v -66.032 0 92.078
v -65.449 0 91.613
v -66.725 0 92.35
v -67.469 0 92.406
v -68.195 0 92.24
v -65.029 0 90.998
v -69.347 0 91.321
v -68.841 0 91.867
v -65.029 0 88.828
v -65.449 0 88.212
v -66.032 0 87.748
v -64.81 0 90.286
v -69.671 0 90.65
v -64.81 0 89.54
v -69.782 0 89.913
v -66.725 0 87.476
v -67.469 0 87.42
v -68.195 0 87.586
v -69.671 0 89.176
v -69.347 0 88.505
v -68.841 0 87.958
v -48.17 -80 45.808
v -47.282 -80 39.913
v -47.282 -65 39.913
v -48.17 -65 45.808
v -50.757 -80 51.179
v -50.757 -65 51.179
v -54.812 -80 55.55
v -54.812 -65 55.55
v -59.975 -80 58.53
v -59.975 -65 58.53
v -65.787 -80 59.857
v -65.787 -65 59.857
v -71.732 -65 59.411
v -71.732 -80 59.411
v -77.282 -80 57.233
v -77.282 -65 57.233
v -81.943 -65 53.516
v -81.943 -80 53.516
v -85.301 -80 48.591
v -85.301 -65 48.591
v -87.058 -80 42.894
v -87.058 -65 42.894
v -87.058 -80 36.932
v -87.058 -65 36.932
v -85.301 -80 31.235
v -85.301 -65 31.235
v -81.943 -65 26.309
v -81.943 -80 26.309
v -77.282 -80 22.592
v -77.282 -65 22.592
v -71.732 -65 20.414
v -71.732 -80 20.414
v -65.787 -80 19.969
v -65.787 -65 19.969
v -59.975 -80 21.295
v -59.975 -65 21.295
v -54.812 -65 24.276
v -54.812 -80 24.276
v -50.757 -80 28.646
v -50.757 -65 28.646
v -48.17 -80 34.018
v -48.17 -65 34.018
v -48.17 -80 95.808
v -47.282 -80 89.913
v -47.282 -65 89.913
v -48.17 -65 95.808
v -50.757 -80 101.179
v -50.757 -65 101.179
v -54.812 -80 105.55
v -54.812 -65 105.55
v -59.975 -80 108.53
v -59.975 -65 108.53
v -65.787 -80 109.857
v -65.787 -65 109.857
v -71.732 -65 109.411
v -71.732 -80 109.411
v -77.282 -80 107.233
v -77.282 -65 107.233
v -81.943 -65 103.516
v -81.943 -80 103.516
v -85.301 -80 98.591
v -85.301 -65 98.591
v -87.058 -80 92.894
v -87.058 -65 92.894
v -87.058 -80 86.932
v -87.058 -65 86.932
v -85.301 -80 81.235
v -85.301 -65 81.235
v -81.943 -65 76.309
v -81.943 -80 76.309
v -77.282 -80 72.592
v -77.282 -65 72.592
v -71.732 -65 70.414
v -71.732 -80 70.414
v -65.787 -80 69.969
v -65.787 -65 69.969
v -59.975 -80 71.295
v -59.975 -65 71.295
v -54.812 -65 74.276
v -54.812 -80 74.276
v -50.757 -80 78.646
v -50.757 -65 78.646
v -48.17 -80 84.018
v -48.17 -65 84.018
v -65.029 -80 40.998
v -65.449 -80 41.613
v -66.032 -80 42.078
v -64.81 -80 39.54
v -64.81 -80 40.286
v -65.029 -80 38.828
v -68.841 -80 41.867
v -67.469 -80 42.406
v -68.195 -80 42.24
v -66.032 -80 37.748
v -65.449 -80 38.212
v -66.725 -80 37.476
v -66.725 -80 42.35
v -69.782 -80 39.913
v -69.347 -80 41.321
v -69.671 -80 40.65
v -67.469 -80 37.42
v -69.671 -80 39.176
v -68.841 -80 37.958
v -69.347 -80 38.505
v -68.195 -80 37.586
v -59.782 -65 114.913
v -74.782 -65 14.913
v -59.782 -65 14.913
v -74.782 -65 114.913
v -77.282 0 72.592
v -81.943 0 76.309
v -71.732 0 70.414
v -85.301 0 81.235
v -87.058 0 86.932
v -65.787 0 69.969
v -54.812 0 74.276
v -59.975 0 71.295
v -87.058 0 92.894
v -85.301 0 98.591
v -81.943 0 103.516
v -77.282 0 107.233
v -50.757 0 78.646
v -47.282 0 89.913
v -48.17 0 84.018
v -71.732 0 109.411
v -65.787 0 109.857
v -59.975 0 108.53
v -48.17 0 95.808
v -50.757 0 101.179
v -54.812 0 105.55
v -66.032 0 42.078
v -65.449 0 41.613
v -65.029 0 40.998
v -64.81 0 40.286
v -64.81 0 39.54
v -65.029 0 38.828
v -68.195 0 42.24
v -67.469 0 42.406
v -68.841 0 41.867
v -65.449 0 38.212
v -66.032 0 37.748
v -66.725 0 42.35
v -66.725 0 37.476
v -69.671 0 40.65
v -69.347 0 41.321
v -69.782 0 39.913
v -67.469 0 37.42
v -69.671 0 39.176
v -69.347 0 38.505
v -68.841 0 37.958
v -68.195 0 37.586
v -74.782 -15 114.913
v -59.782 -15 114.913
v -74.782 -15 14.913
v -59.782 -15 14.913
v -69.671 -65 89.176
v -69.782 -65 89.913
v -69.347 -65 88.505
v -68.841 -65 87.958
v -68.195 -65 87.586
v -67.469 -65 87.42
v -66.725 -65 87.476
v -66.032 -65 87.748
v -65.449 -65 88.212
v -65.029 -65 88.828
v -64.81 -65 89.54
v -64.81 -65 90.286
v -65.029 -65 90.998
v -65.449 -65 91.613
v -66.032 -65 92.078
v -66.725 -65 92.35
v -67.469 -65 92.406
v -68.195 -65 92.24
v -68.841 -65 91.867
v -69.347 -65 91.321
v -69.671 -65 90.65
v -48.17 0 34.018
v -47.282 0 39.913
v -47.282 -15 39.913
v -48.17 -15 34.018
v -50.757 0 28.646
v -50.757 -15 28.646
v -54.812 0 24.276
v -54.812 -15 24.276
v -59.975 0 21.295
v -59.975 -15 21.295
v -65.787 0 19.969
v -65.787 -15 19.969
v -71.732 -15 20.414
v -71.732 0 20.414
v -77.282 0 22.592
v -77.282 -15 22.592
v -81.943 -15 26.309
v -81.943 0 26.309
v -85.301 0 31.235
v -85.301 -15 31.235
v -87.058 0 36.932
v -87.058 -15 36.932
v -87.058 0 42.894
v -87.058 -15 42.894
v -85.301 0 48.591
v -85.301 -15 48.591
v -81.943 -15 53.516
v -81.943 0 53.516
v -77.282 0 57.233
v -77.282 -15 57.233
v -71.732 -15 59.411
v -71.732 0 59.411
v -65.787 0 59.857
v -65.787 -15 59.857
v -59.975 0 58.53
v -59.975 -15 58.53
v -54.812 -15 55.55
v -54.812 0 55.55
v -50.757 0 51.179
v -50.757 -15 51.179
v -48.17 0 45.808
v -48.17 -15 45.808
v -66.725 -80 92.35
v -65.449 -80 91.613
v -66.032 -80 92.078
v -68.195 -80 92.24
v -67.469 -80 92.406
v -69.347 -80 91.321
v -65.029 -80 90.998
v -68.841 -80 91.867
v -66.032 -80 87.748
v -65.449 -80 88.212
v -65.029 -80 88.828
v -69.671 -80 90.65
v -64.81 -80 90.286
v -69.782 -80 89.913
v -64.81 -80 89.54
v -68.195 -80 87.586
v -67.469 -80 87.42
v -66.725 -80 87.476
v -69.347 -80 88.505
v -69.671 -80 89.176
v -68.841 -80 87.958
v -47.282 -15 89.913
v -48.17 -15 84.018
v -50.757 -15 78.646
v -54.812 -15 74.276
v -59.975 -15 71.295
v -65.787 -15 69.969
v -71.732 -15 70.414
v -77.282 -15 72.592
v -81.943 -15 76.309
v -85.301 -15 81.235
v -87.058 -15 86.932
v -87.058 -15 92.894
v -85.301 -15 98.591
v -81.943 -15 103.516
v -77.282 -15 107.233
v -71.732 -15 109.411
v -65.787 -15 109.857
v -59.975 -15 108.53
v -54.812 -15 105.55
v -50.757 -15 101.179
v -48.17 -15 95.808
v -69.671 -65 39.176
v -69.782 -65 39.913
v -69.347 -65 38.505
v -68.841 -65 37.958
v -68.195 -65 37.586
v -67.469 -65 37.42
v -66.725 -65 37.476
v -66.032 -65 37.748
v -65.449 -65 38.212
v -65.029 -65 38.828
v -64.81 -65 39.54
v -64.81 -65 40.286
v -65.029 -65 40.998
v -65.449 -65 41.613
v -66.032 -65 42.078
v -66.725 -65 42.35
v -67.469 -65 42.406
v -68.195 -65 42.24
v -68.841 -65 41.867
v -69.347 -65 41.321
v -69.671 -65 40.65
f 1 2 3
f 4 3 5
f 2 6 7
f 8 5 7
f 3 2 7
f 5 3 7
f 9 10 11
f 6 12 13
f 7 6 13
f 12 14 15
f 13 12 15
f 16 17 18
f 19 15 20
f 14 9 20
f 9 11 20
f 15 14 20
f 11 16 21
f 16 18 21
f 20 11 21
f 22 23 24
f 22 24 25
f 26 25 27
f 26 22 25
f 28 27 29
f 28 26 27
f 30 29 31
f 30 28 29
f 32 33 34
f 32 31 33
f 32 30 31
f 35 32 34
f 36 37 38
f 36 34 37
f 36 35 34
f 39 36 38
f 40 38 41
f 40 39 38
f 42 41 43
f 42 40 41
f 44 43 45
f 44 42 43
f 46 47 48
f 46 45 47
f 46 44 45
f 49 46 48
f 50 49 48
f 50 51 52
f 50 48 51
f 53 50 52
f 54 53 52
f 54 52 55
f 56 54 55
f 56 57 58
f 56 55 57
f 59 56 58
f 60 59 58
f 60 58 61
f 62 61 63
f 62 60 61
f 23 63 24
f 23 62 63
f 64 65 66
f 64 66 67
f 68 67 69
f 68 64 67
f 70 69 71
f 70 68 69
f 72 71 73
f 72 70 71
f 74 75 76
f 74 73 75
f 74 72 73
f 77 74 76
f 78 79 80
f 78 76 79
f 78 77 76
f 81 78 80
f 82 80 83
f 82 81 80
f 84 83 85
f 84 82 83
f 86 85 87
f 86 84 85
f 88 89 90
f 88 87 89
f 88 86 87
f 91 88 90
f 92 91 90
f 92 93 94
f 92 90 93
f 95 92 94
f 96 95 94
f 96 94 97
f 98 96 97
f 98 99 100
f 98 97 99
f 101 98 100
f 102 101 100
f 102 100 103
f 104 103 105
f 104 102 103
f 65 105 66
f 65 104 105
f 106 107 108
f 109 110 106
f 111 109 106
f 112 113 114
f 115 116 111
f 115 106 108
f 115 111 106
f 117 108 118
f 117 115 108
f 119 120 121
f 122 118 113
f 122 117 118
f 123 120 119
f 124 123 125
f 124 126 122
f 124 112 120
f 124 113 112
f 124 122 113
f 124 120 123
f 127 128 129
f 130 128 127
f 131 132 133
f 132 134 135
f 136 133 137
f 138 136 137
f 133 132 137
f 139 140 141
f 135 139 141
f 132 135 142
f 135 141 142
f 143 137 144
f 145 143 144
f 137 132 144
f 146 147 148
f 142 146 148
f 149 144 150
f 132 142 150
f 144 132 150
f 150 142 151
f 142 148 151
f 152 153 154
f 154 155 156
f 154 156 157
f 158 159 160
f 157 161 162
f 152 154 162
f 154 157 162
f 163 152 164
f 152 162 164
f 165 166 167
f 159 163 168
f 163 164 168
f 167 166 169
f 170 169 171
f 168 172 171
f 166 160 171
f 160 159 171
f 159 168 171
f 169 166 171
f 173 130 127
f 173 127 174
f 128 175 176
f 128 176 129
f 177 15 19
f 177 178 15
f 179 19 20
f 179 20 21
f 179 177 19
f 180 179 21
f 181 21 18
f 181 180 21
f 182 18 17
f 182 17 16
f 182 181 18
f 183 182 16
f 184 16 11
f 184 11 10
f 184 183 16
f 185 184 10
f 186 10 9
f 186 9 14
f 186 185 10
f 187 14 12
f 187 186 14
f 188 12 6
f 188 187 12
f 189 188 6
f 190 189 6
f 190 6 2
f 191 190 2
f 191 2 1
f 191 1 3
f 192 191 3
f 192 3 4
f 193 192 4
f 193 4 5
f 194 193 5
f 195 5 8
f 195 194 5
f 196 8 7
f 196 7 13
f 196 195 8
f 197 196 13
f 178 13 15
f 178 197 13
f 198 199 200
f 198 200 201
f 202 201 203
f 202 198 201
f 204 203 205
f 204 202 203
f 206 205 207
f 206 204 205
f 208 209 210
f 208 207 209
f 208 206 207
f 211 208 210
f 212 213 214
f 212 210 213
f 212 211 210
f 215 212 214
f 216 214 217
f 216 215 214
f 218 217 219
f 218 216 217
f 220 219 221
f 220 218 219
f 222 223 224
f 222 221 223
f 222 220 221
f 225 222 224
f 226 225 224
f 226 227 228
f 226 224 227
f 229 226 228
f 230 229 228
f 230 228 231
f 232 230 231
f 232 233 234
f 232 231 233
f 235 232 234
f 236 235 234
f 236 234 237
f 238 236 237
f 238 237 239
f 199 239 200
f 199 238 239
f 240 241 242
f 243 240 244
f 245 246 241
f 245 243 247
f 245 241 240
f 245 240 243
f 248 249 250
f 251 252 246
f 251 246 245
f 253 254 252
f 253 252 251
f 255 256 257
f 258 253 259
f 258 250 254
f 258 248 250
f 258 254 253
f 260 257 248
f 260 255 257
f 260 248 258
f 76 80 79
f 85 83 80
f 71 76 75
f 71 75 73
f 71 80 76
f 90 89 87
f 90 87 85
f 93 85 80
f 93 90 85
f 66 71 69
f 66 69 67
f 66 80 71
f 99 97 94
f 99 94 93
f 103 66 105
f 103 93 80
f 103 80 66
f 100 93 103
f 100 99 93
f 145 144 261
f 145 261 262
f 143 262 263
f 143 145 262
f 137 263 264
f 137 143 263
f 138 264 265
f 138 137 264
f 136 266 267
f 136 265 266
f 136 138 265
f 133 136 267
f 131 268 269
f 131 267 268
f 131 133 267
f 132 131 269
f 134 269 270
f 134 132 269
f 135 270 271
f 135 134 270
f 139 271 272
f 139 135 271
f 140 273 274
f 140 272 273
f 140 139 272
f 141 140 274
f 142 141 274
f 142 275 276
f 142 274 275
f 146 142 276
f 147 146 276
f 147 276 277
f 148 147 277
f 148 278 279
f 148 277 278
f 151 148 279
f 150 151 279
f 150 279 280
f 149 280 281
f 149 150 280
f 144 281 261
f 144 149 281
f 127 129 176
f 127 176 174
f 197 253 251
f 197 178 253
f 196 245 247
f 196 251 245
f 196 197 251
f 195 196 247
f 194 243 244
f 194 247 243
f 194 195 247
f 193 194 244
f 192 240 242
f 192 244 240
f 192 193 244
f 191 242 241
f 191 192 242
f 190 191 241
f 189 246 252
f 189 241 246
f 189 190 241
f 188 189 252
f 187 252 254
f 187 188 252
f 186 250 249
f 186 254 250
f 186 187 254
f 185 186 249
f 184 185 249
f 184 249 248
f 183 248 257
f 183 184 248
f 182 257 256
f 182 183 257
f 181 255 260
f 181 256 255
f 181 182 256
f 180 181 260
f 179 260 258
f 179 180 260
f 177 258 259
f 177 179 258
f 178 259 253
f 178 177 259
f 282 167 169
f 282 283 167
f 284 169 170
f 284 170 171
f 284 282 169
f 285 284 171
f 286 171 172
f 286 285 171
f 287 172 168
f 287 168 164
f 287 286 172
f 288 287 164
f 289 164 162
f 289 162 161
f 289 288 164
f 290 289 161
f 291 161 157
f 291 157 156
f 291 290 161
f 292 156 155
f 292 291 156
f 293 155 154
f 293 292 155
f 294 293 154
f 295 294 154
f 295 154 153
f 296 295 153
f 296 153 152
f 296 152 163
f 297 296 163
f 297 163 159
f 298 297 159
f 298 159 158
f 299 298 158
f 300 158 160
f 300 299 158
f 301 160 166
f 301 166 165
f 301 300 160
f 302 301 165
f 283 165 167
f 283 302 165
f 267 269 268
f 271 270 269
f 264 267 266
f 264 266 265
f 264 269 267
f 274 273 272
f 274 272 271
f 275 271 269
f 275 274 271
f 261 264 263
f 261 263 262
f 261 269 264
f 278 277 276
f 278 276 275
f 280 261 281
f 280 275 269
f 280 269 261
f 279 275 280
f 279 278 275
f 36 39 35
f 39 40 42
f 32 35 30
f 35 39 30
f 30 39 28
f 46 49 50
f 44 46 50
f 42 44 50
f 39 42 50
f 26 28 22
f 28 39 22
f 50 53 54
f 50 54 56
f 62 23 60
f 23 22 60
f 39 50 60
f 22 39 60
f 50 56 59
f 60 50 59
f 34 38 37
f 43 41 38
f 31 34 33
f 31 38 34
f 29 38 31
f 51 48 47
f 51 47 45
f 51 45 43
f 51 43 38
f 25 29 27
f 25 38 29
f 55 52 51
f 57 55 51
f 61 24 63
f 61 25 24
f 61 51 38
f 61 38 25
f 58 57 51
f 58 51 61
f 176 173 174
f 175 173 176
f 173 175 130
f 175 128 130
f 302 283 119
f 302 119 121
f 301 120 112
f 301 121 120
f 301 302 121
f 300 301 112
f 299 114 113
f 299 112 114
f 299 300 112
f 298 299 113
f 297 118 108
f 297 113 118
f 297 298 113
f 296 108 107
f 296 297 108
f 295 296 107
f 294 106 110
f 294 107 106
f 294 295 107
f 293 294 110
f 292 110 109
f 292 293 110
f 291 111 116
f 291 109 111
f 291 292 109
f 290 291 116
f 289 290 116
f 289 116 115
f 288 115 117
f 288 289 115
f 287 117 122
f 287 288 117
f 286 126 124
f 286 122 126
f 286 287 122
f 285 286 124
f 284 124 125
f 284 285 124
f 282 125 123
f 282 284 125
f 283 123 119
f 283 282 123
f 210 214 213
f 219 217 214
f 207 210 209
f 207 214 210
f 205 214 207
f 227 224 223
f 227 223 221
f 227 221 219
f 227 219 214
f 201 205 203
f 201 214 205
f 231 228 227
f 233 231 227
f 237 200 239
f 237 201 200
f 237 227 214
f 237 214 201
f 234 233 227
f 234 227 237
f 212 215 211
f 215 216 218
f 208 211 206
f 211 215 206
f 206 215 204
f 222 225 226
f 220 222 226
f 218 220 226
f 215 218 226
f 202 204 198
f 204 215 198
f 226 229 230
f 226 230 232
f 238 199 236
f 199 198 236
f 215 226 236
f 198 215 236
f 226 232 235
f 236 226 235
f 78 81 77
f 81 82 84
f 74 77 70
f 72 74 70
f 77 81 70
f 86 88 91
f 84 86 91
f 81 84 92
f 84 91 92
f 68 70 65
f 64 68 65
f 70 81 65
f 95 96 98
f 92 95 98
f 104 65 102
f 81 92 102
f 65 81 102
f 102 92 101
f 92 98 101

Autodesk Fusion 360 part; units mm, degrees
sketch "草图1" plane through (0, 0, 0) normal (1, 0, 0) x (0, 0, -1) in component "body"
  line L0 (0, 0) -> (-100, 0)
  line L1 (-100, 0) -> (-100, 50)
  line L2 (-100, 50) -> (0, 50)
  line L3 (0, 50) -> (0, 0)
  dimension "d11" = 100
  dimension "d12" = 50
extrude "拉伸1" add sketch "草图1" along normal blind 15 makes body 1 in component "body"
sketch "草图1 (2)" plane through (0, 50, 0) normal (0, 1, 0) x (-1, 0, 0) in component "axis"
  line L0 (0, 0) -> (0, 100)
  line L1 (0, 100) -> (-15, 100)
  line L2 (-15, 100) -> (-15, 0)
  line L3 (-15, 0) -> (0, 0)
  circle A0 centre (-7.5, 25) radius 2.5
  line L4 (0, 50) -> (-46.2077, 50)
  circle A1 centre (-7.5, 75) radius 2.5
  dimension "d15" = 5
  dimension "d16" = 25
  dimension "d17" = 7.5
extrude "拉伸1'" add sketch "草图1 (2)" along normal blind 15 and the other way blind 65 separate body contours A0 | A1 makes body 2 at (5.0124, 28.3333, 24.7511) makes body 3 at (5.0124, 28.3333, 74.7511) in component "axis"
sketch "草图2" plane through (0, 0, 0) normal (0, -1, 0) x (1, 0, 0)
  line L0 (0, 100) -> (0, 0)
  line L1 (0, 0) -> (15, 0)
  line L2 (15, 0) -> (15, 100)
  line L3 (15, 100) -> (0, 100)
  circle A0 centre (-67.2818, 39.9129) radius 20
  dimension "d26" = 40
extrude "拉伸2" add sketch "草图2" along normal blind 15 separate body contours A0 makes body 4
copy_body "实体->零部件1" bodies 4 removing the originals makes body 5 in component "wheel"
component "body" placed x (1, 0, 0) y (0, -1, 0) z (0, 0, -1) at (-74.7818, -15, 114.9129)
component "axis" placed x (1, 0, 0) y (0, -1, 0) z (0, 0, -1) at (-74.7818, -15, 114.9129)
component "wheel" placed x (1, 0, 0) y (0, 1, 0) z (0, 0, 1) at (0, 0, 0)
component "wheel" placed x (1, 0, 0) y (0, -1, 0) z (0, 0, -1) at (0, -80, 79.8258)
component "wheel" placed x (1, 0, 0) y (0, -1, 0) z (0, 0, -1) at (0, -80, 129.8258)
component "wheel" placed x (1, 0, 0) y (0, 1, 0) z (0, 0, 1) at (0, 0, 50)
equation "length = 100 mm"
equation "width = 50 mm"
equation "thickness = 15 mm"
equation "wheelDistance = 50 mm"
equation "wheelDiameter = 40 mm"
equation "wheelThickness = 15 mm"
equation "d11 = length"
equation "d12 = width"
equation "d13 = thickness"
equation "d16 = length / 4"
equation "d17 = thickness / 2"
equation "d18 = wheelThickness"
equation "d20 = wheelThickness + width"
equation "d24 = length / 4"
equation "d25 = wheelThickness"
equation "d26 = wheelDiameter"
equation "d27 = wheelThickness"
equation "d31 = 0.25 * length"
equation "d32 = wheelDistance / 2 - width / 2"
equation "d35 = -0.25 * length"
equation "d36 = wheelDistance / 2 - width / 2"
equation "d39 = 0.25 * length"
equation "d40 = wheelDistance / 2 - width / 2"
equation "d43 = -0.25 * length"
equation "d44 = wheelDistance / 2 - width / 2"
